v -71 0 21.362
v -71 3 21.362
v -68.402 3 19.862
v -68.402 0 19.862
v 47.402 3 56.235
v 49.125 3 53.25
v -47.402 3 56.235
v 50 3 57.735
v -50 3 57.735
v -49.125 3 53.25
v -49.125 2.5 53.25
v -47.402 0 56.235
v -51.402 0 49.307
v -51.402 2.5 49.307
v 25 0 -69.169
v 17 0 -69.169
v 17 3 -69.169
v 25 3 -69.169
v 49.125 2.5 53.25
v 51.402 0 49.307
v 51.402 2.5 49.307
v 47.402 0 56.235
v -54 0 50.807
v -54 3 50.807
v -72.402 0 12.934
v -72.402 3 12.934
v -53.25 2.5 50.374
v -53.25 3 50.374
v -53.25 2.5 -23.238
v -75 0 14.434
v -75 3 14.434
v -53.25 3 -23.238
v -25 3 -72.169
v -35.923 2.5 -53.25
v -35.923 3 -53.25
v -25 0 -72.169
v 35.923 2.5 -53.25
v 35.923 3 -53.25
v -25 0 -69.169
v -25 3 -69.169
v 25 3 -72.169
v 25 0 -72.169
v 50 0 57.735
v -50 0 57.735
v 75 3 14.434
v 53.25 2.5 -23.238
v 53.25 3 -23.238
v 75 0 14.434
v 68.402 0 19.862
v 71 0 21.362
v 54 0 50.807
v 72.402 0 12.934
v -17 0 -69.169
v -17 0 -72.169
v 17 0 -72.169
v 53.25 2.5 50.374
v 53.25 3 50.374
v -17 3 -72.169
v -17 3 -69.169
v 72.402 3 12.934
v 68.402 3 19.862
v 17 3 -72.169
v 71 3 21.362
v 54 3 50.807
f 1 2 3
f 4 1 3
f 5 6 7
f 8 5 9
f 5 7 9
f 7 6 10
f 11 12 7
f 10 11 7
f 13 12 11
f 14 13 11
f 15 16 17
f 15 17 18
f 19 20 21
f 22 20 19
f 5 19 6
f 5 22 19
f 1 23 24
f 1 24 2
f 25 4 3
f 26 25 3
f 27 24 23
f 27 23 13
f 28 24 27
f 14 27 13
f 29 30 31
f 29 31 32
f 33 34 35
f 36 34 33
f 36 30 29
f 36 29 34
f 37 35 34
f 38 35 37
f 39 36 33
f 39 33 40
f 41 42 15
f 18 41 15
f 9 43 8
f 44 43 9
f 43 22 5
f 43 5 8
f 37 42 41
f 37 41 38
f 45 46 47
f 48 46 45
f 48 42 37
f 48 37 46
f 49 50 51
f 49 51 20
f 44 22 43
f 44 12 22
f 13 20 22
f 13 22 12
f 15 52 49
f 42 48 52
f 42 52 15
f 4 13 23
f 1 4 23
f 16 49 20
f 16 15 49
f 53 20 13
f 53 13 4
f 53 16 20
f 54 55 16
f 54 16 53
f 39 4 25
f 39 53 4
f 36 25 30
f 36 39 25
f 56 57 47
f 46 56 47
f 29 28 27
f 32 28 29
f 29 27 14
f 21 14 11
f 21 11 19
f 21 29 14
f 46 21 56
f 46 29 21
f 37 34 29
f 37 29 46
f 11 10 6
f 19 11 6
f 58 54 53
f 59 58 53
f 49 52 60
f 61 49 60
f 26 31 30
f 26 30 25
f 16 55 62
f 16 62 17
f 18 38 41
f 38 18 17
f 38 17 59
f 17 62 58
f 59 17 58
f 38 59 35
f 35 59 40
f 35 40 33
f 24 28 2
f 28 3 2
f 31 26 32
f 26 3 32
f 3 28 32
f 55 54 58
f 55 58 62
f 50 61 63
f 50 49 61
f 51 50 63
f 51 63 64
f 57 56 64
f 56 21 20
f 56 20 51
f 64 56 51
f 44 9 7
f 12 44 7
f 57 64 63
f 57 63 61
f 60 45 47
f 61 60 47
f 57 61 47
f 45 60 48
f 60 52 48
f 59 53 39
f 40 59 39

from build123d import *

# Parameters (mm, degrees)
BOSS_EXTRUDE1_DEPTH     = 3
SKETCH2_W               = 106.5
SKETCH2_H               = 106.5
CUT_EXTRUDE1_DEPTH      = 0.5
SKETCH4_W               = 8
SKETCH4_H               = 3
CUT_EXTRUDE2_DEPTH      = 105.126526789
CIRPATTERN1_START       = -24.999999535
CIRPATTERN1_OUTLINE_W   = 3
CIRPATTERN1_OUTLINE_H   = 3
CIRPATTERN1_DEPTH       = 8
CIRPATTERN1_START_2     = 16.999999535
CIRPATTERN1_2_OUTLINE_W = 3
CIRPATTERN1_2_OUTLINE_H = 3
CIRPATTERN1_2_DEPTH     = 8
CIRPATTERN1_3_DEPTH     = 8
CIRPATTERN1_4_DEPTH     = 8


# Read off the part's stored shape, not the designer's step: CirPattern1
with BuildPart() as part:
    # Sketch1 → Boss-Extrude1 (new body)
    with BuildSketch(Plane(origin=(0, 0, 0), x_dir=(1, 0, 0), z_dir=(0, 1, 0))):
        Polygon((-25.000000465, 72.168783917), (24.999999535, 72.168783917), (75.000001394, -14.433756462), (49.999999071, -57.735027455), (-50, -57.735027455), (-75.000000465, -14.433756462), align=None)
    extrude(amount=BOSS_EXTRUDE1_DEPTH)

    # Sketch2 → Cut-Extrude1 (cut)
    with BuildSketch(Plane(origin=(0, 3, 0), x_dir=(1, 0, 0), z_dir=(0, 1, 0))):
        Rectangle(SKETCH2_W, SKETCH2_H)
    extrude(amount=-CUT_EXTRUDE1_DEPTH, mode=Mode.SUBTRACT)

    # Sketch4 → Cut-Extrude2 (cut, through all)
    with BuildSketch(Plane.XZ):
        with Locations((20.999999535, -70.668783917)):
            Rectangle(SKETCH4_W, SKETCH4_H)
    cut_extrude2 = extrude(amount=-CUT_EXTRUDE2_DEPTH, mode=Mode.SUBTRACT)

    # Mirror1: Cut-Extrude2 across plane
    add(cut_extrude2.mirror(Plane(origin=(0, 0, 0), x_dir=(0, 0, 1), z_dir=(1, 0, 0))), mode=Mode.SUBTRACT)

    # CirPattern1 outline → CirPattern1 (cut)
    with BuildSketch(Plane(origin=(0, 0, 0), x_dir=(0.8660254037844362, 0, -0.5000000000000042), z_dir=(0.5000000000000042, 0, 0.8660254037844363)).offset(CIRPATTERN1_START)):
        with Locations((-70.668783917, 1.5)):
            Rectangle(CIRPATTERN1_OUTLINE_W, CIRPATTERN1_OUTLINE_H)
    extrude(amount=CIRPATTERN1_DEPTH, mode=Mode.SUBTRACT)

    # CirPattern1 2 outline → CirPattern1 2 (cut)
    with BuildSketch(Plane(origin=(0, 0, 0), x_dir=(0.8660254037844362, 0, -0.5000000000000042), z_dir=(0.5000000000000042, 0, 0.8660254037844363)).offset(CIRPATTERN1_START_2)):
        with Locations((-70.668783917, 1.5)):
            Rectangle(CIRPATTERN1_2_OUTLINE_W, CIRPATTERN1_2_OUTLINE_H)
    extrude(amount=CIRPATTERN1_2_DEPTH, mode=Mode.SUBTRACT)

    # CirPattern1 3 outline → CirPattern1 3 (cut)
    with BuildSketch(Plane(origin=(0, 0, 0), x_dir=(0.8660254037844431, 0, 0.4999999999999921), z_dir=(0.4999999999999921, 0, -0.8660254037844433)).offset(CIRPATTERN1_START)):
        Polygon((69.168783917, -3), (72.168784721, -3), (72.168784587, 0), (69.168783917, 0), align=None)
    extrude(amount=CIRPATTERN1_3_DEPTH, mode=Mode.SUBTRACT)

    # CirPattern1 4 outline → CirPattern1 4 (cut)
    with BuildSketch(Plane(origin=(0, 0, 0), x_dir=(0.8660254037844431, 0, 0.4999999999999921), z_dir=(0.4999999999999921, 0, -0.8660254037844433)).offset(CIRPATTERN1_START_2)):
        Polygon((69.168783917, -3), (72.168784721, -3), (72.168784587, 0), (69.168783917, 0), align=None)
    extrude(amount=CIRPATTERN1_4_DEPTH, mode=Mode.SUBTRACT)


solid = part.part
